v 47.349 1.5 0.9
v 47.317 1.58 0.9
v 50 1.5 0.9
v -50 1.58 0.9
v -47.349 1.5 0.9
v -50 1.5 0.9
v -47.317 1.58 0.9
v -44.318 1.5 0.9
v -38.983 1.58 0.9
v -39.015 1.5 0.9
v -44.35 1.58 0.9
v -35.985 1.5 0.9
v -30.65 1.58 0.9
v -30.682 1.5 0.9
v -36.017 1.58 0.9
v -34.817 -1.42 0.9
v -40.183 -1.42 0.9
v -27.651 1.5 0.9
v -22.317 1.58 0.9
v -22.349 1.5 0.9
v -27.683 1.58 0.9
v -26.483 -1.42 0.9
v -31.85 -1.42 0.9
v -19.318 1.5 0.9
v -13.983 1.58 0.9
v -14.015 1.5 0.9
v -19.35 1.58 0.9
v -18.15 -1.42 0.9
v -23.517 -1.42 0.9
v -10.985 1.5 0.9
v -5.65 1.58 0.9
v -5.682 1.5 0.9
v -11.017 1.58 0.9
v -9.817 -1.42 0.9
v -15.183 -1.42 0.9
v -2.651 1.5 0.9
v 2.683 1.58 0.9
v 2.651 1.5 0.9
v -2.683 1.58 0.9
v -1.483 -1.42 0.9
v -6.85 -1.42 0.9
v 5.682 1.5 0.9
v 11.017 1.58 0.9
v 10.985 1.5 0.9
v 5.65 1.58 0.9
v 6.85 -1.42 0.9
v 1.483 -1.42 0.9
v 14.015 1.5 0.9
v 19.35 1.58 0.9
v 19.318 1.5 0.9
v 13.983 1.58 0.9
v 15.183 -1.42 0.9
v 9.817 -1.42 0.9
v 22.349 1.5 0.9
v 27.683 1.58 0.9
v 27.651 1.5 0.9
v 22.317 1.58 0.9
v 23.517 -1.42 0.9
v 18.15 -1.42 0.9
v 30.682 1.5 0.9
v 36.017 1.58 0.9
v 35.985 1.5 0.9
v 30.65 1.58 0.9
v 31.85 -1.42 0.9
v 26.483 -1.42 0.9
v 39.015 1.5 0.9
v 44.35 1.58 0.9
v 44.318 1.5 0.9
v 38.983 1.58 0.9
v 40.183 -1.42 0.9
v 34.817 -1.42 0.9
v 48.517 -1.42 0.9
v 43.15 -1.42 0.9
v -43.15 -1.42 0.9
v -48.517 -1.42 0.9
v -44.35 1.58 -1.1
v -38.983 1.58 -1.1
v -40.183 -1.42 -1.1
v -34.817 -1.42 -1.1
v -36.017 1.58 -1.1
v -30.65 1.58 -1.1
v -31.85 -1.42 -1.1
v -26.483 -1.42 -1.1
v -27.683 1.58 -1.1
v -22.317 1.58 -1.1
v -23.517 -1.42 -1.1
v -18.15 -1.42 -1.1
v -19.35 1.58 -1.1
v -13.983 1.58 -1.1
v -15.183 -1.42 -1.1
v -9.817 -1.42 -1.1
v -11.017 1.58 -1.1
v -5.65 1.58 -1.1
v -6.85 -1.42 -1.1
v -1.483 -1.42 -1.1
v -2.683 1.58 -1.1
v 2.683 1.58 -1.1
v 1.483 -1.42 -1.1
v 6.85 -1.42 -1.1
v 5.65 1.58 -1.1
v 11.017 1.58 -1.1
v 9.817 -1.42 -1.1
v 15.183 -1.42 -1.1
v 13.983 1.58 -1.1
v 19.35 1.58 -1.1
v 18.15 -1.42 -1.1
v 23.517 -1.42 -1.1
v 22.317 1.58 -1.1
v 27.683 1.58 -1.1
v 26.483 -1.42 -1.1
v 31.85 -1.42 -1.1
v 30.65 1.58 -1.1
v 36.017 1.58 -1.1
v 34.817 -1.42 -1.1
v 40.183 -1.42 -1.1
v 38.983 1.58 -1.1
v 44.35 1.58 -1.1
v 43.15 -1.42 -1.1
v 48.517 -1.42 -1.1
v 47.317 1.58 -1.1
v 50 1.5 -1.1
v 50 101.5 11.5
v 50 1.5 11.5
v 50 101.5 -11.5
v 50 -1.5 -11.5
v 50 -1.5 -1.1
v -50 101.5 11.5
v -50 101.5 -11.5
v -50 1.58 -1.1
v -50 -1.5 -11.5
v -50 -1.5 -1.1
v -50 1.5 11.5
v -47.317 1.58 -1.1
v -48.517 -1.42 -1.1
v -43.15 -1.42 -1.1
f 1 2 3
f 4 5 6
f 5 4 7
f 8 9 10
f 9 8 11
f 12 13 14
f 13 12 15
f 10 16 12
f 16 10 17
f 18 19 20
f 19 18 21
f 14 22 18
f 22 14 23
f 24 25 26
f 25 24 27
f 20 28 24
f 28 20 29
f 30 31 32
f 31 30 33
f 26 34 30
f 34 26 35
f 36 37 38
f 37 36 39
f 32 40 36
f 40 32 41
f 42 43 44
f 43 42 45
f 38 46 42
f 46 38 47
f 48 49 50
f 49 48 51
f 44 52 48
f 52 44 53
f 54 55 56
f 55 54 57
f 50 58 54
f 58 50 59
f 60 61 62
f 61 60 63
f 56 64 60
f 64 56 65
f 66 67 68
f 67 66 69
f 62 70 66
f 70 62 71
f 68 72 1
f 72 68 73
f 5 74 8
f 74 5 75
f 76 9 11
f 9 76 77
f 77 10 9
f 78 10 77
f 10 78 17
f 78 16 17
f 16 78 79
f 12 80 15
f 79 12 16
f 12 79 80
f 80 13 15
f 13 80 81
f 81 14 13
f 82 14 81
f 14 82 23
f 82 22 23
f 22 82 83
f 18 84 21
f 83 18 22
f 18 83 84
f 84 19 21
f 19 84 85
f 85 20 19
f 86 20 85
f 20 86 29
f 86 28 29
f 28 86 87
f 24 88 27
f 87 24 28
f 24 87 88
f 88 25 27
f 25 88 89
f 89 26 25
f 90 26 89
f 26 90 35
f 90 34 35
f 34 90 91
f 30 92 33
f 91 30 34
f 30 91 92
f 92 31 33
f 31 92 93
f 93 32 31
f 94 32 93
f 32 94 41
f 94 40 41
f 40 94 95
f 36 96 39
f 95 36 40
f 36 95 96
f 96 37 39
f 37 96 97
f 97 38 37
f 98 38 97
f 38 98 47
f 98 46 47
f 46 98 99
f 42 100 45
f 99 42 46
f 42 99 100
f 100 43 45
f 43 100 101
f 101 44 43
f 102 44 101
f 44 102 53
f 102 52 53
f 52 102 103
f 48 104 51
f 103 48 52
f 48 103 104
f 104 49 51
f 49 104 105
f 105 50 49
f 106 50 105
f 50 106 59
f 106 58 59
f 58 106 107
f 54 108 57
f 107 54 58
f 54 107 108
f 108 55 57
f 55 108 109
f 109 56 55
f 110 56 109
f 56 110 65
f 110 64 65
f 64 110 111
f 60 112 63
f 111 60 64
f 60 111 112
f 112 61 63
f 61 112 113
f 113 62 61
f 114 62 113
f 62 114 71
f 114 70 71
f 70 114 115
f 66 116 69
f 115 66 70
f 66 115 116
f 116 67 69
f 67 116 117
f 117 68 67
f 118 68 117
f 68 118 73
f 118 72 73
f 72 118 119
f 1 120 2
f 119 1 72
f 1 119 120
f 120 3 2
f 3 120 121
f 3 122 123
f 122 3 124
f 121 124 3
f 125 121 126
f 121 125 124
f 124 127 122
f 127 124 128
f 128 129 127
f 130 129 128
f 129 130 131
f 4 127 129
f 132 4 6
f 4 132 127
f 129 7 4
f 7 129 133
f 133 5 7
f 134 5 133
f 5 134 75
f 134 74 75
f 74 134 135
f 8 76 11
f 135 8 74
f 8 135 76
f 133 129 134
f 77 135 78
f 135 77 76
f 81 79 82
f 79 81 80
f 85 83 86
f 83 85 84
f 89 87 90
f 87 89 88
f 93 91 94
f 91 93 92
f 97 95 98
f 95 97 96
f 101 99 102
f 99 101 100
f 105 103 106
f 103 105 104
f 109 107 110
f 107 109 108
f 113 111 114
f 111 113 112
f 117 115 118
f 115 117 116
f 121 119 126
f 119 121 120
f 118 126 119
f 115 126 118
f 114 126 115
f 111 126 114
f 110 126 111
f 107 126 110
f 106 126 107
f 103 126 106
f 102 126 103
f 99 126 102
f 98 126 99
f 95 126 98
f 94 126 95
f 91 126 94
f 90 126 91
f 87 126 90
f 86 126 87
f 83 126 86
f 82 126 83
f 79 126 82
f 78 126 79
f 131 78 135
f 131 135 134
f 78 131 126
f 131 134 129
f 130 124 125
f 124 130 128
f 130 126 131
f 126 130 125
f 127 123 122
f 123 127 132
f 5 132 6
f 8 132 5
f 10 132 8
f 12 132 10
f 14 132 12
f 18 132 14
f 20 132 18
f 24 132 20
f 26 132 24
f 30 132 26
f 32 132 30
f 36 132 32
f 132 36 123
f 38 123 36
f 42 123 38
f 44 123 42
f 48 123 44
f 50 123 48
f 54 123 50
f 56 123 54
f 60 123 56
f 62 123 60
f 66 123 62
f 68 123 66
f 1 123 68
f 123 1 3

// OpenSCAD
dovetail_tension = 0.08;
dovetail_shape = 0.4;
dovetail_depth = 3;
dovetail_lower_cover = 0.4;
dovetail_upper_cover = 0.6;

function shift(pt, vec) = [for (p = vec) p + pt];

function zig(start_x, width) =
    let(
        a = width/4, 
        d = -dovetail_depth,
        s = dovetail_depth * dovetail_shape / 2
    )
    shift(
        [start_x, dovetail_tension],
        [[0,0],[a+s, 0],[a-s, d],[3*a+s, d],[3*a-s, 0]]
    );

module dovetail(width, n, thickness) {
    h = thickness - dovetail_upper_cover;
    unit = width / n;
    translate([-width/2, dovetail_depth/2, -thickness/2]) {
        linear_extrude(h)
        polygon(
            [for (i=[0:n-1]) each(zig(unit*i, unit)),
             [width, 0], [width, width], [0,width]]);
        translate([0, -dovetail_depth, -10])
        cube([width, width + dovetail_depth, dovetail_lower_cover + 10]);
        translate([0,0,h])
        cube([width, width, dovetail_upper_cover + 10]);
    }
}

dovetail(100, 12, 3);
